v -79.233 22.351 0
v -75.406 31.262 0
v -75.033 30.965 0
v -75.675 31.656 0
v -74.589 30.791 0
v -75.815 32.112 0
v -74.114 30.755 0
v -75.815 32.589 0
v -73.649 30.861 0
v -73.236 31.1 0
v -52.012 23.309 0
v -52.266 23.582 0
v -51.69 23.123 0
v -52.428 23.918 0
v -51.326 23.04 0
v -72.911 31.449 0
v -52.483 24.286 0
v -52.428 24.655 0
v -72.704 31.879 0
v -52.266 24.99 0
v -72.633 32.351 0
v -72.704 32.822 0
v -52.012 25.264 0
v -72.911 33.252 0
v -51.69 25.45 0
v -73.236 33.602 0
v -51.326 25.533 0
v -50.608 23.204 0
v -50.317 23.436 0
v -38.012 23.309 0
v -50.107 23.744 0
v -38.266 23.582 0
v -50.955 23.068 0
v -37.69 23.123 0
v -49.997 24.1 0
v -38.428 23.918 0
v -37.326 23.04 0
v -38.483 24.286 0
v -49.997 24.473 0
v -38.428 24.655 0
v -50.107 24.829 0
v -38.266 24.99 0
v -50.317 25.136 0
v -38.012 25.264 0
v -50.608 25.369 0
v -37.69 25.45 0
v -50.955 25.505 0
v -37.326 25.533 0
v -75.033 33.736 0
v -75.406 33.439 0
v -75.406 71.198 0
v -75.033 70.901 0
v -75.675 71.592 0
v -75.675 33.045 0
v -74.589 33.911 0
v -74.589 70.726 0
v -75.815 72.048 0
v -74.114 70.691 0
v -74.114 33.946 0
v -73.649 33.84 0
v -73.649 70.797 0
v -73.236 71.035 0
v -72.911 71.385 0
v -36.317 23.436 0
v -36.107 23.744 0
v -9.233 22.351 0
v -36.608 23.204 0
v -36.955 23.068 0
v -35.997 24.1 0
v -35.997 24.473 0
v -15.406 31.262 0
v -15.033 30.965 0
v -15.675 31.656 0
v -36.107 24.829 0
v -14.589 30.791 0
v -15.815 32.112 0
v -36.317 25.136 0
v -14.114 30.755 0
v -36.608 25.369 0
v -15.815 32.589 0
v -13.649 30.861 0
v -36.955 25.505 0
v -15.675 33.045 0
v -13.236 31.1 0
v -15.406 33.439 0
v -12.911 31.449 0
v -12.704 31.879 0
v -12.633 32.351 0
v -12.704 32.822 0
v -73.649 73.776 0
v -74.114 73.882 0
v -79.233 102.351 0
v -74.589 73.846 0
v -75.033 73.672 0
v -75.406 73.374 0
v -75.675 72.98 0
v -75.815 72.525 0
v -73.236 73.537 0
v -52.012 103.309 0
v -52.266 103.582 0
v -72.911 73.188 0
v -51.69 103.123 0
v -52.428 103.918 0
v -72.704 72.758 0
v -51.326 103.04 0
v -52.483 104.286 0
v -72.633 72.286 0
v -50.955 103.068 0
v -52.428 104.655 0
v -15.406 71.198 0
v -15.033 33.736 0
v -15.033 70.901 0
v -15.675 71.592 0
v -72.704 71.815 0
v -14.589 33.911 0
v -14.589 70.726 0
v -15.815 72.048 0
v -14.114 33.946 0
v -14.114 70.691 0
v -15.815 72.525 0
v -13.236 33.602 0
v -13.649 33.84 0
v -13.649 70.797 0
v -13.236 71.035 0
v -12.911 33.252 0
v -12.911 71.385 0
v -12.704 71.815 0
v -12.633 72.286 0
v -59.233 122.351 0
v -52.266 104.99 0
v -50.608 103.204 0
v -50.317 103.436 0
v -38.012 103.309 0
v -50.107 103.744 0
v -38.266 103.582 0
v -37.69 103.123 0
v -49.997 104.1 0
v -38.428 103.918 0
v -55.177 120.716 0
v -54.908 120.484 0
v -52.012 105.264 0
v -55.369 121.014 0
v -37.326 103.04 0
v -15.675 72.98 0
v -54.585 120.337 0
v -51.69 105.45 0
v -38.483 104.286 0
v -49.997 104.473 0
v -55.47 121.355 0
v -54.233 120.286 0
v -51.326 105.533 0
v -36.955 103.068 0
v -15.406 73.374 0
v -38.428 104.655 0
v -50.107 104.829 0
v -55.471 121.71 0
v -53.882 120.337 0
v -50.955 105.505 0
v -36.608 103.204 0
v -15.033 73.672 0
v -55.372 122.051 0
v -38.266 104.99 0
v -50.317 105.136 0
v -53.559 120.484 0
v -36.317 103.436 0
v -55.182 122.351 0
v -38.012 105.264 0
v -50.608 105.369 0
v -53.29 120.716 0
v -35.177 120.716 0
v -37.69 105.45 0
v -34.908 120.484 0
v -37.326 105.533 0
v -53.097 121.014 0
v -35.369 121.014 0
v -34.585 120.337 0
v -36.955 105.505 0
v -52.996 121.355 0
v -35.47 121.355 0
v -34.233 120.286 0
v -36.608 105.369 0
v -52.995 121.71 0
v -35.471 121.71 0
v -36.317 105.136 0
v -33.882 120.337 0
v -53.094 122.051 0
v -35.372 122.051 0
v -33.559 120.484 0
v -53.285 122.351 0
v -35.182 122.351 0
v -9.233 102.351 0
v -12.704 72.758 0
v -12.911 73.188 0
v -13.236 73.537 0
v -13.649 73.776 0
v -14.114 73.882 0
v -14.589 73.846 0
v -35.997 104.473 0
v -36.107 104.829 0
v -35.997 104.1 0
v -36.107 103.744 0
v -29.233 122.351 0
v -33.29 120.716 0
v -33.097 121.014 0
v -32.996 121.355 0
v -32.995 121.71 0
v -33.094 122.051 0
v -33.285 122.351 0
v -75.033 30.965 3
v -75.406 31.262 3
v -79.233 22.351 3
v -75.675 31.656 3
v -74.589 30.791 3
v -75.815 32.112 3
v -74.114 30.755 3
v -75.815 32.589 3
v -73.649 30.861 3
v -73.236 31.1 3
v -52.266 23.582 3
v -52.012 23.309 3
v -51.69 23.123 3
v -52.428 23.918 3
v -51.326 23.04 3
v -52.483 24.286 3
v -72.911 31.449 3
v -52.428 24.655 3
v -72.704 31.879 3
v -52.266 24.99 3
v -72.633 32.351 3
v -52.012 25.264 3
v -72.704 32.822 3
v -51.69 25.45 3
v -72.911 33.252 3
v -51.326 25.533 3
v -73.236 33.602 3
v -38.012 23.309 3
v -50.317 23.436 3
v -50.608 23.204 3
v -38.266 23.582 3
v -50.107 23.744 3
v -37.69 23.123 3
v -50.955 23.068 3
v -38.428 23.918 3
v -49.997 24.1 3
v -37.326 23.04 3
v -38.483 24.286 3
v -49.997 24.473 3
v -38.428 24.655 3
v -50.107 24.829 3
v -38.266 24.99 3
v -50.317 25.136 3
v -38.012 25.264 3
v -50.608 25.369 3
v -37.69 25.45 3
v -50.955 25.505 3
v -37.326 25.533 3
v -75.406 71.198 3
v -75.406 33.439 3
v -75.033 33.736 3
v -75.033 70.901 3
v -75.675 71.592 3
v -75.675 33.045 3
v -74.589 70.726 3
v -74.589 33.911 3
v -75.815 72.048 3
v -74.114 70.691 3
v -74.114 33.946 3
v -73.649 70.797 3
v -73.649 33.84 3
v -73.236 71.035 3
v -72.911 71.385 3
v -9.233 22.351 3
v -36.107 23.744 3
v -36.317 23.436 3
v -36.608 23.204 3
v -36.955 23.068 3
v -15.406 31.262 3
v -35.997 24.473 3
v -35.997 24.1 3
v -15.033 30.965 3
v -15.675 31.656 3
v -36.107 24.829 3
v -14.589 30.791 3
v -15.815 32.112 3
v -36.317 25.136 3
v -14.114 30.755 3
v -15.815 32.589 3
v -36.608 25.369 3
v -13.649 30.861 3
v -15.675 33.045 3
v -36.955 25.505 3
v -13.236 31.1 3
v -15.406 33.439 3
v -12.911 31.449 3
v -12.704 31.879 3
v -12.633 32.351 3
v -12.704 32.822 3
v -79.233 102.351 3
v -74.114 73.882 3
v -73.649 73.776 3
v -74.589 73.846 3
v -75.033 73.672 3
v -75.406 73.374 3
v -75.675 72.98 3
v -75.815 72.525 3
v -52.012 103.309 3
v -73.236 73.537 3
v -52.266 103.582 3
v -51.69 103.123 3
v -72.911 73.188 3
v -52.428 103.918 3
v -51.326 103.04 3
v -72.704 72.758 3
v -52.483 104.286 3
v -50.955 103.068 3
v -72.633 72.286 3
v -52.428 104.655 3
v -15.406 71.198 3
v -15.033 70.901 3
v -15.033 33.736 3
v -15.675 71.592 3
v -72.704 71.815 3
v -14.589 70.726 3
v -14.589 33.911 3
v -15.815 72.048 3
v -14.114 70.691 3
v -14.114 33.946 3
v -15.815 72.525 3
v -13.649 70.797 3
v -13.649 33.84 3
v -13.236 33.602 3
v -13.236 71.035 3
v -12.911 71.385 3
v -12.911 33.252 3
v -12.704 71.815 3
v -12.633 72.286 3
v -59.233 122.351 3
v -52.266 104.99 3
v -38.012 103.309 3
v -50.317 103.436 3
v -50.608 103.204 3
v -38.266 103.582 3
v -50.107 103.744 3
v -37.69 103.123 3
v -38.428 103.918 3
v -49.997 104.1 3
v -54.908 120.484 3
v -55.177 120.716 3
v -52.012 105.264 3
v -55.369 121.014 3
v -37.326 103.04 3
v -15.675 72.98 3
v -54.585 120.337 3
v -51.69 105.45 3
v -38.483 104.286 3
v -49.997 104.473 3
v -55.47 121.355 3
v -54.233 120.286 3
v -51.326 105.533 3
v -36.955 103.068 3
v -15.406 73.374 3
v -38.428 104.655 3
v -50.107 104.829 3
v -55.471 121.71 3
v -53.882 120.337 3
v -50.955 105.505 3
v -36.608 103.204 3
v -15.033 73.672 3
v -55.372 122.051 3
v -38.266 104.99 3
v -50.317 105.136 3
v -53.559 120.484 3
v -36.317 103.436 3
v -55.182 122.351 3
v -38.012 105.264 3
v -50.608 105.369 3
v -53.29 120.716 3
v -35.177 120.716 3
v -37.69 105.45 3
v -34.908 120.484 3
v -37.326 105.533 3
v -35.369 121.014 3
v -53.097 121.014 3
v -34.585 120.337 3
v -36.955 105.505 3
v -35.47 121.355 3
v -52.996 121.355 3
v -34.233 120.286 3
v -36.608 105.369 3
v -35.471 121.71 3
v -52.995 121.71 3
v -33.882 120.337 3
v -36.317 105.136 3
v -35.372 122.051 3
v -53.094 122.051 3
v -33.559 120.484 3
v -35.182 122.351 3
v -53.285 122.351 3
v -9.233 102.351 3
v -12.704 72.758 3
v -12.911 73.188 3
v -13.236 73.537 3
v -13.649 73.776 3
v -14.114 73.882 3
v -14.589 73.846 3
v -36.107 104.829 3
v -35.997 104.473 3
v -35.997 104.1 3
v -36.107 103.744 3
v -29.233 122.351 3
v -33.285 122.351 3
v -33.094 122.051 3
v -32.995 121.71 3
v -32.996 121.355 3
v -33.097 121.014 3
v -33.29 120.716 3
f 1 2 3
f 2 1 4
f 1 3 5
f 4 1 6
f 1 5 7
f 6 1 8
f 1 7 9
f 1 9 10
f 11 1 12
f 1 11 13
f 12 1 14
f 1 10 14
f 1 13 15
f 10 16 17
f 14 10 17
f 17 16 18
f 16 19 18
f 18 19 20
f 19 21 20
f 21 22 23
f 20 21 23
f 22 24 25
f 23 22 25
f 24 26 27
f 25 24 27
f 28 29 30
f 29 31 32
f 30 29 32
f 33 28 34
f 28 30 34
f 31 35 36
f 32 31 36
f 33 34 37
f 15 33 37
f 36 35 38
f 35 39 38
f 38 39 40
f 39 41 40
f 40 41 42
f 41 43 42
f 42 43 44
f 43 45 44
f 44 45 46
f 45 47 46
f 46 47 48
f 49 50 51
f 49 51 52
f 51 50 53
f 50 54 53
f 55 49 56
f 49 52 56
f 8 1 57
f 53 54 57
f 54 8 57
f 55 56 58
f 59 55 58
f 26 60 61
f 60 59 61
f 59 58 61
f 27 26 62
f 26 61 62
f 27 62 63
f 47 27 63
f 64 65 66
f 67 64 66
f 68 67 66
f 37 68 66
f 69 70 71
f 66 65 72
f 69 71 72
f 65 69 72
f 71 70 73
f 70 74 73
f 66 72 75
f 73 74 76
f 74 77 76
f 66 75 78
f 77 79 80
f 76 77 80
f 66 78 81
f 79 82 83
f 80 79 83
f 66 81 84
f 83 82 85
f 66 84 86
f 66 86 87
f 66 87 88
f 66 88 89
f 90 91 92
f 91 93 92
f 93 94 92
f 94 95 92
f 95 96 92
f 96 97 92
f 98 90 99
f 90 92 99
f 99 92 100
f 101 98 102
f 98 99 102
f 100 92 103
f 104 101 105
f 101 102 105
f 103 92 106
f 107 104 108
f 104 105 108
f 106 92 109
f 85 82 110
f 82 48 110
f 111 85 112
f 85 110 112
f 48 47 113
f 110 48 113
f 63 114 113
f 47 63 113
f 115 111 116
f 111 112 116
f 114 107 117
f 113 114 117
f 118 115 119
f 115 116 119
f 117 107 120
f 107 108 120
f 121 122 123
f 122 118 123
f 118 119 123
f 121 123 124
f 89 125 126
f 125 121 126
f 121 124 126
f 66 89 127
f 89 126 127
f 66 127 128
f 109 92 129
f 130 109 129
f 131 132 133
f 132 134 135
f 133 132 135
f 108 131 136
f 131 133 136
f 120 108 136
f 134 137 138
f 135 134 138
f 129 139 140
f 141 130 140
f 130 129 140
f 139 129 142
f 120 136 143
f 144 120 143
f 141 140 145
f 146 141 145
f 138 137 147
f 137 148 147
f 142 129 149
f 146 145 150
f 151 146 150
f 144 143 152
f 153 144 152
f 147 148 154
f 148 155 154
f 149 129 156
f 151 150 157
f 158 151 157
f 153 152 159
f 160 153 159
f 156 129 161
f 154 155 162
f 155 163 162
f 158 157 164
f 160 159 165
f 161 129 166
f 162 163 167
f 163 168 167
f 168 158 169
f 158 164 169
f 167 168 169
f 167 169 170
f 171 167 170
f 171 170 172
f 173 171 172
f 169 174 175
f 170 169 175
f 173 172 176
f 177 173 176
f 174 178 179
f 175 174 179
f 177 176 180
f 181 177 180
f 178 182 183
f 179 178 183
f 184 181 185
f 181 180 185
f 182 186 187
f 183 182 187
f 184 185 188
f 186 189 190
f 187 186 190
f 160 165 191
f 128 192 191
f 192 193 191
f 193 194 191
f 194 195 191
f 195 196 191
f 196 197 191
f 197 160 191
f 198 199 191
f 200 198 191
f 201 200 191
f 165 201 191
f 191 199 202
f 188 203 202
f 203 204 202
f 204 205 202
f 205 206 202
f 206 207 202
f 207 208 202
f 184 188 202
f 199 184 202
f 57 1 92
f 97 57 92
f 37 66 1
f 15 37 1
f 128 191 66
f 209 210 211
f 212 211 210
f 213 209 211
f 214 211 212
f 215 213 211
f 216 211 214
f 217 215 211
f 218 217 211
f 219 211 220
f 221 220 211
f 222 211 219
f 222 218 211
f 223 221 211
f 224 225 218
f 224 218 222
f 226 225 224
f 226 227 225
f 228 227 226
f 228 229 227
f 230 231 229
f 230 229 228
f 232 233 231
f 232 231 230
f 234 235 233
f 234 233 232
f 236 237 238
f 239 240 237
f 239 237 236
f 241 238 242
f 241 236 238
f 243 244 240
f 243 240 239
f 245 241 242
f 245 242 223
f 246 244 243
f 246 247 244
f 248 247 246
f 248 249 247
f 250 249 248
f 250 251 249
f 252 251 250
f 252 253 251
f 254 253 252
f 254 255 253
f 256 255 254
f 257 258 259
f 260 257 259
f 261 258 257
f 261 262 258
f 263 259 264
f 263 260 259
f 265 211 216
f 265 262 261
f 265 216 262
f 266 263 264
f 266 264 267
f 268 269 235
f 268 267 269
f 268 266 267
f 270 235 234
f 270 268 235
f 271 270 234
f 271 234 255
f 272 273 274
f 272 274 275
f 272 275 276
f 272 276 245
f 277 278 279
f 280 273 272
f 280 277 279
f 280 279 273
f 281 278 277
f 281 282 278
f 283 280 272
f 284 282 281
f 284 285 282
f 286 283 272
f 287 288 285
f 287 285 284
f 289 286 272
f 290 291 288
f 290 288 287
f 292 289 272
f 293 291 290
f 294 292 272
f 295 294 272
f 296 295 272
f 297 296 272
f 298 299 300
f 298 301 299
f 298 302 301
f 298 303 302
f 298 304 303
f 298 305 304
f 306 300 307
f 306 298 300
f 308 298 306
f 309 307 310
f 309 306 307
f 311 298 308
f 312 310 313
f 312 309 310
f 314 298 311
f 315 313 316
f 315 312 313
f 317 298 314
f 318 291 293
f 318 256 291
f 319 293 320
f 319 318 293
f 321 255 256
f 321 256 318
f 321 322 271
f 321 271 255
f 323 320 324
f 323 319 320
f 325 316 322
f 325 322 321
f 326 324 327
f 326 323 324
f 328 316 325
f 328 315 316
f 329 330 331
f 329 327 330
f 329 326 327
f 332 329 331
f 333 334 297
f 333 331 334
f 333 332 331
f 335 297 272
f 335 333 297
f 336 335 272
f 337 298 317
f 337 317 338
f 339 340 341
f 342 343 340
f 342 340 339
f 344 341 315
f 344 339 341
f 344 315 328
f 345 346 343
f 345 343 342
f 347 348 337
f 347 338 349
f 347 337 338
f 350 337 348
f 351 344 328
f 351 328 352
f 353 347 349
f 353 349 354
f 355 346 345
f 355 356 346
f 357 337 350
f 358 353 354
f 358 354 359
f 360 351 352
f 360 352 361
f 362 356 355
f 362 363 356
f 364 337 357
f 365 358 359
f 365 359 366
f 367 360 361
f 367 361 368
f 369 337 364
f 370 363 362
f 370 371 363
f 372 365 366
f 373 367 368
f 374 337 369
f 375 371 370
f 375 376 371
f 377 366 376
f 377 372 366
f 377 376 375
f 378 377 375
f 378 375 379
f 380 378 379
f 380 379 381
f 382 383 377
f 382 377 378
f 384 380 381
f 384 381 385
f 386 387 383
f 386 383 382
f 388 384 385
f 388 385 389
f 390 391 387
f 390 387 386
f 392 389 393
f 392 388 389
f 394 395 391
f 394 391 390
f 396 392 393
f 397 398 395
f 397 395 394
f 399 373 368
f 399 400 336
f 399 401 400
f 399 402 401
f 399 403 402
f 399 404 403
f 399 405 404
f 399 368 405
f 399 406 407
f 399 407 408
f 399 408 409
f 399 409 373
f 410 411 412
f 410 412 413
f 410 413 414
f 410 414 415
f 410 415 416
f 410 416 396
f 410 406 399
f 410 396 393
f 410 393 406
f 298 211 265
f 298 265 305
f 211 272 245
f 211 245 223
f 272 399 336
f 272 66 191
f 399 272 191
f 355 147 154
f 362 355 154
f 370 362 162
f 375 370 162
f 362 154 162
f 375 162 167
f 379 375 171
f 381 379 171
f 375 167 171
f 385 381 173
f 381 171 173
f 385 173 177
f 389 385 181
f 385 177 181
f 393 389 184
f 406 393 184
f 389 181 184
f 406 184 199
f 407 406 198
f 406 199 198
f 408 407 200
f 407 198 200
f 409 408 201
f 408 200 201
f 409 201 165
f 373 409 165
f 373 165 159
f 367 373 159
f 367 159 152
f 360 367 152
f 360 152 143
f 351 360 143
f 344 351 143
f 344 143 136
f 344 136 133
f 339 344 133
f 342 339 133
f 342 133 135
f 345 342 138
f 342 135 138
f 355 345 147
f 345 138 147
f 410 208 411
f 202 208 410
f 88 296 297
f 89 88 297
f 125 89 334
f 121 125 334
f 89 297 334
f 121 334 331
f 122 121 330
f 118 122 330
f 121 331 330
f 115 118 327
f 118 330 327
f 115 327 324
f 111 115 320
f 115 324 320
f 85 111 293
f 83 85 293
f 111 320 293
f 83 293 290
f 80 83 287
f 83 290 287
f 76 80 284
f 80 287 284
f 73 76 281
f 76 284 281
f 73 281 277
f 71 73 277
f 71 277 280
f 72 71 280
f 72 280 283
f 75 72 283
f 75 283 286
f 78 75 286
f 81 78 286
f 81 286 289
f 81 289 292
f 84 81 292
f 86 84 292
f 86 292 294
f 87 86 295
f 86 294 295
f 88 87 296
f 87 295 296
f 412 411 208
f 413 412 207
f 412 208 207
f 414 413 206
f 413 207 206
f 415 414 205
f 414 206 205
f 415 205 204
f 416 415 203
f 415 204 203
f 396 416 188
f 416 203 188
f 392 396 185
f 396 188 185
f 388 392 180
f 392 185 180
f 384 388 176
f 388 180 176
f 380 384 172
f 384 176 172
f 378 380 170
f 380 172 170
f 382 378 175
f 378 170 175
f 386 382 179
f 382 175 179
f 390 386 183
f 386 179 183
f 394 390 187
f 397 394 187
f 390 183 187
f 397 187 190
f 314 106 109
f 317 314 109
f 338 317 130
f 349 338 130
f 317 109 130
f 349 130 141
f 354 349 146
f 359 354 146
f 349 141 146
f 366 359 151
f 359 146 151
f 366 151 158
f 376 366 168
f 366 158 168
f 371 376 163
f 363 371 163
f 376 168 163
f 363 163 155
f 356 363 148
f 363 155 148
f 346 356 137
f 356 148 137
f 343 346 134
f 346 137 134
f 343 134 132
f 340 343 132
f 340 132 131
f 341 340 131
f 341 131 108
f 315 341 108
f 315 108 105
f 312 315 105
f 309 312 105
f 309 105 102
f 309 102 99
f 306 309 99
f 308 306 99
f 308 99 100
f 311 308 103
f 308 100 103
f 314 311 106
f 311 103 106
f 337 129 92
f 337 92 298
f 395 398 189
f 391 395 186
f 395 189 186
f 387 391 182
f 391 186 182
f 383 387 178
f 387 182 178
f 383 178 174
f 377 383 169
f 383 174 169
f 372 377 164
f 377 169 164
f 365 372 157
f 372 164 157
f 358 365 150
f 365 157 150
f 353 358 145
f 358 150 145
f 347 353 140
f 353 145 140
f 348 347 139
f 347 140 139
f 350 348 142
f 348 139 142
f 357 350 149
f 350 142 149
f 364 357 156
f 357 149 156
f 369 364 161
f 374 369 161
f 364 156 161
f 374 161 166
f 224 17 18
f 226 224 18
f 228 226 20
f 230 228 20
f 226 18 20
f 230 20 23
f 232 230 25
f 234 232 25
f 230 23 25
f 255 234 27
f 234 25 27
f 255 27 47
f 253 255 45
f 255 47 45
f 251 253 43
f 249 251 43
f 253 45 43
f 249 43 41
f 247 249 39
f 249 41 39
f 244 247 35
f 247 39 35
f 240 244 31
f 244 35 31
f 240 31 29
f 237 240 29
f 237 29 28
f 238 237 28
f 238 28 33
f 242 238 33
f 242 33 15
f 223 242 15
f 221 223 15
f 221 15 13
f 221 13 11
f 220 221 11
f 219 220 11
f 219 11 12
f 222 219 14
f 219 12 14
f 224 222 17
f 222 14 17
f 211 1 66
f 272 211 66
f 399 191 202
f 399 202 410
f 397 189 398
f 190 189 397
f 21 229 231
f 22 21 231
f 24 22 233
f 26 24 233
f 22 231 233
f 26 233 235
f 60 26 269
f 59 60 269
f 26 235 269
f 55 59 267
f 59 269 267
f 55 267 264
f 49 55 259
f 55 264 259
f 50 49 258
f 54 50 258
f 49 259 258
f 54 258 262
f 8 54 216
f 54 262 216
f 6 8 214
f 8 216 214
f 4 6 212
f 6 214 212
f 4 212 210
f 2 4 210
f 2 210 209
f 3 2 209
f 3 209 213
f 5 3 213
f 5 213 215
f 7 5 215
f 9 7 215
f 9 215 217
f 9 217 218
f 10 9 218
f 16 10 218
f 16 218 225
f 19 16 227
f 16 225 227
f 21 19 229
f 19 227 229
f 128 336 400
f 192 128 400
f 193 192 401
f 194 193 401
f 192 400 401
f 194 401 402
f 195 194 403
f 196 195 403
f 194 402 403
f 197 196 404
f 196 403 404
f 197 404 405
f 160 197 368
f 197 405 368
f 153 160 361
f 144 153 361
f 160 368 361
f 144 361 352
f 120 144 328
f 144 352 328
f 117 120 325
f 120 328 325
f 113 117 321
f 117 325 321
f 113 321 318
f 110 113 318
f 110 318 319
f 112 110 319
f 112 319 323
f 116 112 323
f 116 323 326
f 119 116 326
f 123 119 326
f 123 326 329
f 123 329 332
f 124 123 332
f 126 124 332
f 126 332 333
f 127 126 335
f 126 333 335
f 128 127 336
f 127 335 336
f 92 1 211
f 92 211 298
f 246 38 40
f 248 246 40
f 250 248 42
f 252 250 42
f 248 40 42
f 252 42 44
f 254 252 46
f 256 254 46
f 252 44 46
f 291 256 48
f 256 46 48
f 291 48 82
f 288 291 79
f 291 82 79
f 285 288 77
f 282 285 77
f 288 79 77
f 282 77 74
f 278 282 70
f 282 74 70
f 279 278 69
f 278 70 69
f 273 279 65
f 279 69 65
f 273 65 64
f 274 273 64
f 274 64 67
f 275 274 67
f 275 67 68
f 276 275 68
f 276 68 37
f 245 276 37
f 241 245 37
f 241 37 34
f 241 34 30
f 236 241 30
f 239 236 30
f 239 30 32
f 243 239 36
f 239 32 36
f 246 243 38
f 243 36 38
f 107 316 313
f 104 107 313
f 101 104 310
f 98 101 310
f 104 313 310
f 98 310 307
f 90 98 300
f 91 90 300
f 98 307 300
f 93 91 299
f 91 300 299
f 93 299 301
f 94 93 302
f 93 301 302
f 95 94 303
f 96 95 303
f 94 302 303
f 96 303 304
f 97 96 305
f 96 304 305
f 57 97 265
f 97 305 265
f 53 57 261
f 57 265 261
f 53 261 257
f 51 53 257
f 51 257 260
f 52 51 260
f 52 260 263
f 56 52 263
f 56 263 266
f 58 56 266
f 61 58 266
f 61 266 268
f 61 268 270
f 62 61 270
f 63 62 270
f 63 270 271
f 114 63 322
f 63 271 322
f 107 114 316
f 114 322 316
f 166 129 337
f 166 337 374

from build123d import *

# Parameters (mm, degrees)
SKETCH_1_W          = 70
SKETCH_1_H          = 100
EXTRUDE_1_DEPTH     = 3
SKETCH_2_R          = 1.6
CUT_EXTRUDE_1_DEPTH = 3
SKETCH_3_R          = 1.25
CUT_EXTRUDE_2_DEPTH = 3
CHAMFER_1_SIZE      = 20


with BuildPart() as part:
    # 草图1 → 凸台-拉伸1 (new body)
    with BuildSketch(Plane.XY):
        with Locations((-44.233232324, 72.350653578)):
            Rectangle(SKETCH_1_W, SKETCH_1_H)
    extrude(amount=EXTRUDE_1_DEPTH)

    # 草图2 → 切除-拉伸1 (cut)
    with BuildSketch(Plane.XY.offset(3)):
        with Locations((-74.233232324, 32.350653578)):
            Circle(SKETCH_2_R)
        with Locations((-14.233232324, 32.350653578)):
            Circle(SKETCH_2_R)
        with Locations((-14.233232324, 72.286219849)):
            Circle(SKETCH_2_R)
        with Locations((-74.233232324, 72.286219849)):
            Circle(SKETCH_2_R)
    extrude(amount=-CUT_EXTRUDE_1_DEPTH, mode=Mode.SUBTRACT)

    # 草图3 → 切除-拉伸2 (cut)
    with BuildSketch(Plane(origin=(0, 0, 0), x_dir=(-1, 0, 0), z_dir=(0, 0, -1))):
        with Locations((37.233066324, 104.286219849)):
            Circle(SKETCH_3_R)
        with Locations((51.233066324, 104.286219849)):
            Circle(SKETCH_3_R)
        with Locations((37.233066324, 24.286219849)):
            Circle(SKETCH_3_R)
        with Locations((51.233066324, 24.286219849)):
            Circle(SKETCH_3_R)
        with Locations((34.233232324, 121.536231848)):
            Circle(SKETCH_3_R)
        with Locations((54.233232324, 121.536231848)):
            Circle(SKETCH_3_R)
    extrude(amount=-CUT_EXTRUDE_2_DEPTH, mode=Mode.SUBTRACT)

    # 倒角1
    chamfer_1_edges = [part.edges().sort_by_distance(p)[0] for p in [
        (-79.233232324, 122.350653578, 1.5),
        (-9.233232324, 122.350653578, 1.5),
    ]]
    chamfer(chamfer_1_edges, length=CHAMFER_1_SIZE)


solid = part.part
